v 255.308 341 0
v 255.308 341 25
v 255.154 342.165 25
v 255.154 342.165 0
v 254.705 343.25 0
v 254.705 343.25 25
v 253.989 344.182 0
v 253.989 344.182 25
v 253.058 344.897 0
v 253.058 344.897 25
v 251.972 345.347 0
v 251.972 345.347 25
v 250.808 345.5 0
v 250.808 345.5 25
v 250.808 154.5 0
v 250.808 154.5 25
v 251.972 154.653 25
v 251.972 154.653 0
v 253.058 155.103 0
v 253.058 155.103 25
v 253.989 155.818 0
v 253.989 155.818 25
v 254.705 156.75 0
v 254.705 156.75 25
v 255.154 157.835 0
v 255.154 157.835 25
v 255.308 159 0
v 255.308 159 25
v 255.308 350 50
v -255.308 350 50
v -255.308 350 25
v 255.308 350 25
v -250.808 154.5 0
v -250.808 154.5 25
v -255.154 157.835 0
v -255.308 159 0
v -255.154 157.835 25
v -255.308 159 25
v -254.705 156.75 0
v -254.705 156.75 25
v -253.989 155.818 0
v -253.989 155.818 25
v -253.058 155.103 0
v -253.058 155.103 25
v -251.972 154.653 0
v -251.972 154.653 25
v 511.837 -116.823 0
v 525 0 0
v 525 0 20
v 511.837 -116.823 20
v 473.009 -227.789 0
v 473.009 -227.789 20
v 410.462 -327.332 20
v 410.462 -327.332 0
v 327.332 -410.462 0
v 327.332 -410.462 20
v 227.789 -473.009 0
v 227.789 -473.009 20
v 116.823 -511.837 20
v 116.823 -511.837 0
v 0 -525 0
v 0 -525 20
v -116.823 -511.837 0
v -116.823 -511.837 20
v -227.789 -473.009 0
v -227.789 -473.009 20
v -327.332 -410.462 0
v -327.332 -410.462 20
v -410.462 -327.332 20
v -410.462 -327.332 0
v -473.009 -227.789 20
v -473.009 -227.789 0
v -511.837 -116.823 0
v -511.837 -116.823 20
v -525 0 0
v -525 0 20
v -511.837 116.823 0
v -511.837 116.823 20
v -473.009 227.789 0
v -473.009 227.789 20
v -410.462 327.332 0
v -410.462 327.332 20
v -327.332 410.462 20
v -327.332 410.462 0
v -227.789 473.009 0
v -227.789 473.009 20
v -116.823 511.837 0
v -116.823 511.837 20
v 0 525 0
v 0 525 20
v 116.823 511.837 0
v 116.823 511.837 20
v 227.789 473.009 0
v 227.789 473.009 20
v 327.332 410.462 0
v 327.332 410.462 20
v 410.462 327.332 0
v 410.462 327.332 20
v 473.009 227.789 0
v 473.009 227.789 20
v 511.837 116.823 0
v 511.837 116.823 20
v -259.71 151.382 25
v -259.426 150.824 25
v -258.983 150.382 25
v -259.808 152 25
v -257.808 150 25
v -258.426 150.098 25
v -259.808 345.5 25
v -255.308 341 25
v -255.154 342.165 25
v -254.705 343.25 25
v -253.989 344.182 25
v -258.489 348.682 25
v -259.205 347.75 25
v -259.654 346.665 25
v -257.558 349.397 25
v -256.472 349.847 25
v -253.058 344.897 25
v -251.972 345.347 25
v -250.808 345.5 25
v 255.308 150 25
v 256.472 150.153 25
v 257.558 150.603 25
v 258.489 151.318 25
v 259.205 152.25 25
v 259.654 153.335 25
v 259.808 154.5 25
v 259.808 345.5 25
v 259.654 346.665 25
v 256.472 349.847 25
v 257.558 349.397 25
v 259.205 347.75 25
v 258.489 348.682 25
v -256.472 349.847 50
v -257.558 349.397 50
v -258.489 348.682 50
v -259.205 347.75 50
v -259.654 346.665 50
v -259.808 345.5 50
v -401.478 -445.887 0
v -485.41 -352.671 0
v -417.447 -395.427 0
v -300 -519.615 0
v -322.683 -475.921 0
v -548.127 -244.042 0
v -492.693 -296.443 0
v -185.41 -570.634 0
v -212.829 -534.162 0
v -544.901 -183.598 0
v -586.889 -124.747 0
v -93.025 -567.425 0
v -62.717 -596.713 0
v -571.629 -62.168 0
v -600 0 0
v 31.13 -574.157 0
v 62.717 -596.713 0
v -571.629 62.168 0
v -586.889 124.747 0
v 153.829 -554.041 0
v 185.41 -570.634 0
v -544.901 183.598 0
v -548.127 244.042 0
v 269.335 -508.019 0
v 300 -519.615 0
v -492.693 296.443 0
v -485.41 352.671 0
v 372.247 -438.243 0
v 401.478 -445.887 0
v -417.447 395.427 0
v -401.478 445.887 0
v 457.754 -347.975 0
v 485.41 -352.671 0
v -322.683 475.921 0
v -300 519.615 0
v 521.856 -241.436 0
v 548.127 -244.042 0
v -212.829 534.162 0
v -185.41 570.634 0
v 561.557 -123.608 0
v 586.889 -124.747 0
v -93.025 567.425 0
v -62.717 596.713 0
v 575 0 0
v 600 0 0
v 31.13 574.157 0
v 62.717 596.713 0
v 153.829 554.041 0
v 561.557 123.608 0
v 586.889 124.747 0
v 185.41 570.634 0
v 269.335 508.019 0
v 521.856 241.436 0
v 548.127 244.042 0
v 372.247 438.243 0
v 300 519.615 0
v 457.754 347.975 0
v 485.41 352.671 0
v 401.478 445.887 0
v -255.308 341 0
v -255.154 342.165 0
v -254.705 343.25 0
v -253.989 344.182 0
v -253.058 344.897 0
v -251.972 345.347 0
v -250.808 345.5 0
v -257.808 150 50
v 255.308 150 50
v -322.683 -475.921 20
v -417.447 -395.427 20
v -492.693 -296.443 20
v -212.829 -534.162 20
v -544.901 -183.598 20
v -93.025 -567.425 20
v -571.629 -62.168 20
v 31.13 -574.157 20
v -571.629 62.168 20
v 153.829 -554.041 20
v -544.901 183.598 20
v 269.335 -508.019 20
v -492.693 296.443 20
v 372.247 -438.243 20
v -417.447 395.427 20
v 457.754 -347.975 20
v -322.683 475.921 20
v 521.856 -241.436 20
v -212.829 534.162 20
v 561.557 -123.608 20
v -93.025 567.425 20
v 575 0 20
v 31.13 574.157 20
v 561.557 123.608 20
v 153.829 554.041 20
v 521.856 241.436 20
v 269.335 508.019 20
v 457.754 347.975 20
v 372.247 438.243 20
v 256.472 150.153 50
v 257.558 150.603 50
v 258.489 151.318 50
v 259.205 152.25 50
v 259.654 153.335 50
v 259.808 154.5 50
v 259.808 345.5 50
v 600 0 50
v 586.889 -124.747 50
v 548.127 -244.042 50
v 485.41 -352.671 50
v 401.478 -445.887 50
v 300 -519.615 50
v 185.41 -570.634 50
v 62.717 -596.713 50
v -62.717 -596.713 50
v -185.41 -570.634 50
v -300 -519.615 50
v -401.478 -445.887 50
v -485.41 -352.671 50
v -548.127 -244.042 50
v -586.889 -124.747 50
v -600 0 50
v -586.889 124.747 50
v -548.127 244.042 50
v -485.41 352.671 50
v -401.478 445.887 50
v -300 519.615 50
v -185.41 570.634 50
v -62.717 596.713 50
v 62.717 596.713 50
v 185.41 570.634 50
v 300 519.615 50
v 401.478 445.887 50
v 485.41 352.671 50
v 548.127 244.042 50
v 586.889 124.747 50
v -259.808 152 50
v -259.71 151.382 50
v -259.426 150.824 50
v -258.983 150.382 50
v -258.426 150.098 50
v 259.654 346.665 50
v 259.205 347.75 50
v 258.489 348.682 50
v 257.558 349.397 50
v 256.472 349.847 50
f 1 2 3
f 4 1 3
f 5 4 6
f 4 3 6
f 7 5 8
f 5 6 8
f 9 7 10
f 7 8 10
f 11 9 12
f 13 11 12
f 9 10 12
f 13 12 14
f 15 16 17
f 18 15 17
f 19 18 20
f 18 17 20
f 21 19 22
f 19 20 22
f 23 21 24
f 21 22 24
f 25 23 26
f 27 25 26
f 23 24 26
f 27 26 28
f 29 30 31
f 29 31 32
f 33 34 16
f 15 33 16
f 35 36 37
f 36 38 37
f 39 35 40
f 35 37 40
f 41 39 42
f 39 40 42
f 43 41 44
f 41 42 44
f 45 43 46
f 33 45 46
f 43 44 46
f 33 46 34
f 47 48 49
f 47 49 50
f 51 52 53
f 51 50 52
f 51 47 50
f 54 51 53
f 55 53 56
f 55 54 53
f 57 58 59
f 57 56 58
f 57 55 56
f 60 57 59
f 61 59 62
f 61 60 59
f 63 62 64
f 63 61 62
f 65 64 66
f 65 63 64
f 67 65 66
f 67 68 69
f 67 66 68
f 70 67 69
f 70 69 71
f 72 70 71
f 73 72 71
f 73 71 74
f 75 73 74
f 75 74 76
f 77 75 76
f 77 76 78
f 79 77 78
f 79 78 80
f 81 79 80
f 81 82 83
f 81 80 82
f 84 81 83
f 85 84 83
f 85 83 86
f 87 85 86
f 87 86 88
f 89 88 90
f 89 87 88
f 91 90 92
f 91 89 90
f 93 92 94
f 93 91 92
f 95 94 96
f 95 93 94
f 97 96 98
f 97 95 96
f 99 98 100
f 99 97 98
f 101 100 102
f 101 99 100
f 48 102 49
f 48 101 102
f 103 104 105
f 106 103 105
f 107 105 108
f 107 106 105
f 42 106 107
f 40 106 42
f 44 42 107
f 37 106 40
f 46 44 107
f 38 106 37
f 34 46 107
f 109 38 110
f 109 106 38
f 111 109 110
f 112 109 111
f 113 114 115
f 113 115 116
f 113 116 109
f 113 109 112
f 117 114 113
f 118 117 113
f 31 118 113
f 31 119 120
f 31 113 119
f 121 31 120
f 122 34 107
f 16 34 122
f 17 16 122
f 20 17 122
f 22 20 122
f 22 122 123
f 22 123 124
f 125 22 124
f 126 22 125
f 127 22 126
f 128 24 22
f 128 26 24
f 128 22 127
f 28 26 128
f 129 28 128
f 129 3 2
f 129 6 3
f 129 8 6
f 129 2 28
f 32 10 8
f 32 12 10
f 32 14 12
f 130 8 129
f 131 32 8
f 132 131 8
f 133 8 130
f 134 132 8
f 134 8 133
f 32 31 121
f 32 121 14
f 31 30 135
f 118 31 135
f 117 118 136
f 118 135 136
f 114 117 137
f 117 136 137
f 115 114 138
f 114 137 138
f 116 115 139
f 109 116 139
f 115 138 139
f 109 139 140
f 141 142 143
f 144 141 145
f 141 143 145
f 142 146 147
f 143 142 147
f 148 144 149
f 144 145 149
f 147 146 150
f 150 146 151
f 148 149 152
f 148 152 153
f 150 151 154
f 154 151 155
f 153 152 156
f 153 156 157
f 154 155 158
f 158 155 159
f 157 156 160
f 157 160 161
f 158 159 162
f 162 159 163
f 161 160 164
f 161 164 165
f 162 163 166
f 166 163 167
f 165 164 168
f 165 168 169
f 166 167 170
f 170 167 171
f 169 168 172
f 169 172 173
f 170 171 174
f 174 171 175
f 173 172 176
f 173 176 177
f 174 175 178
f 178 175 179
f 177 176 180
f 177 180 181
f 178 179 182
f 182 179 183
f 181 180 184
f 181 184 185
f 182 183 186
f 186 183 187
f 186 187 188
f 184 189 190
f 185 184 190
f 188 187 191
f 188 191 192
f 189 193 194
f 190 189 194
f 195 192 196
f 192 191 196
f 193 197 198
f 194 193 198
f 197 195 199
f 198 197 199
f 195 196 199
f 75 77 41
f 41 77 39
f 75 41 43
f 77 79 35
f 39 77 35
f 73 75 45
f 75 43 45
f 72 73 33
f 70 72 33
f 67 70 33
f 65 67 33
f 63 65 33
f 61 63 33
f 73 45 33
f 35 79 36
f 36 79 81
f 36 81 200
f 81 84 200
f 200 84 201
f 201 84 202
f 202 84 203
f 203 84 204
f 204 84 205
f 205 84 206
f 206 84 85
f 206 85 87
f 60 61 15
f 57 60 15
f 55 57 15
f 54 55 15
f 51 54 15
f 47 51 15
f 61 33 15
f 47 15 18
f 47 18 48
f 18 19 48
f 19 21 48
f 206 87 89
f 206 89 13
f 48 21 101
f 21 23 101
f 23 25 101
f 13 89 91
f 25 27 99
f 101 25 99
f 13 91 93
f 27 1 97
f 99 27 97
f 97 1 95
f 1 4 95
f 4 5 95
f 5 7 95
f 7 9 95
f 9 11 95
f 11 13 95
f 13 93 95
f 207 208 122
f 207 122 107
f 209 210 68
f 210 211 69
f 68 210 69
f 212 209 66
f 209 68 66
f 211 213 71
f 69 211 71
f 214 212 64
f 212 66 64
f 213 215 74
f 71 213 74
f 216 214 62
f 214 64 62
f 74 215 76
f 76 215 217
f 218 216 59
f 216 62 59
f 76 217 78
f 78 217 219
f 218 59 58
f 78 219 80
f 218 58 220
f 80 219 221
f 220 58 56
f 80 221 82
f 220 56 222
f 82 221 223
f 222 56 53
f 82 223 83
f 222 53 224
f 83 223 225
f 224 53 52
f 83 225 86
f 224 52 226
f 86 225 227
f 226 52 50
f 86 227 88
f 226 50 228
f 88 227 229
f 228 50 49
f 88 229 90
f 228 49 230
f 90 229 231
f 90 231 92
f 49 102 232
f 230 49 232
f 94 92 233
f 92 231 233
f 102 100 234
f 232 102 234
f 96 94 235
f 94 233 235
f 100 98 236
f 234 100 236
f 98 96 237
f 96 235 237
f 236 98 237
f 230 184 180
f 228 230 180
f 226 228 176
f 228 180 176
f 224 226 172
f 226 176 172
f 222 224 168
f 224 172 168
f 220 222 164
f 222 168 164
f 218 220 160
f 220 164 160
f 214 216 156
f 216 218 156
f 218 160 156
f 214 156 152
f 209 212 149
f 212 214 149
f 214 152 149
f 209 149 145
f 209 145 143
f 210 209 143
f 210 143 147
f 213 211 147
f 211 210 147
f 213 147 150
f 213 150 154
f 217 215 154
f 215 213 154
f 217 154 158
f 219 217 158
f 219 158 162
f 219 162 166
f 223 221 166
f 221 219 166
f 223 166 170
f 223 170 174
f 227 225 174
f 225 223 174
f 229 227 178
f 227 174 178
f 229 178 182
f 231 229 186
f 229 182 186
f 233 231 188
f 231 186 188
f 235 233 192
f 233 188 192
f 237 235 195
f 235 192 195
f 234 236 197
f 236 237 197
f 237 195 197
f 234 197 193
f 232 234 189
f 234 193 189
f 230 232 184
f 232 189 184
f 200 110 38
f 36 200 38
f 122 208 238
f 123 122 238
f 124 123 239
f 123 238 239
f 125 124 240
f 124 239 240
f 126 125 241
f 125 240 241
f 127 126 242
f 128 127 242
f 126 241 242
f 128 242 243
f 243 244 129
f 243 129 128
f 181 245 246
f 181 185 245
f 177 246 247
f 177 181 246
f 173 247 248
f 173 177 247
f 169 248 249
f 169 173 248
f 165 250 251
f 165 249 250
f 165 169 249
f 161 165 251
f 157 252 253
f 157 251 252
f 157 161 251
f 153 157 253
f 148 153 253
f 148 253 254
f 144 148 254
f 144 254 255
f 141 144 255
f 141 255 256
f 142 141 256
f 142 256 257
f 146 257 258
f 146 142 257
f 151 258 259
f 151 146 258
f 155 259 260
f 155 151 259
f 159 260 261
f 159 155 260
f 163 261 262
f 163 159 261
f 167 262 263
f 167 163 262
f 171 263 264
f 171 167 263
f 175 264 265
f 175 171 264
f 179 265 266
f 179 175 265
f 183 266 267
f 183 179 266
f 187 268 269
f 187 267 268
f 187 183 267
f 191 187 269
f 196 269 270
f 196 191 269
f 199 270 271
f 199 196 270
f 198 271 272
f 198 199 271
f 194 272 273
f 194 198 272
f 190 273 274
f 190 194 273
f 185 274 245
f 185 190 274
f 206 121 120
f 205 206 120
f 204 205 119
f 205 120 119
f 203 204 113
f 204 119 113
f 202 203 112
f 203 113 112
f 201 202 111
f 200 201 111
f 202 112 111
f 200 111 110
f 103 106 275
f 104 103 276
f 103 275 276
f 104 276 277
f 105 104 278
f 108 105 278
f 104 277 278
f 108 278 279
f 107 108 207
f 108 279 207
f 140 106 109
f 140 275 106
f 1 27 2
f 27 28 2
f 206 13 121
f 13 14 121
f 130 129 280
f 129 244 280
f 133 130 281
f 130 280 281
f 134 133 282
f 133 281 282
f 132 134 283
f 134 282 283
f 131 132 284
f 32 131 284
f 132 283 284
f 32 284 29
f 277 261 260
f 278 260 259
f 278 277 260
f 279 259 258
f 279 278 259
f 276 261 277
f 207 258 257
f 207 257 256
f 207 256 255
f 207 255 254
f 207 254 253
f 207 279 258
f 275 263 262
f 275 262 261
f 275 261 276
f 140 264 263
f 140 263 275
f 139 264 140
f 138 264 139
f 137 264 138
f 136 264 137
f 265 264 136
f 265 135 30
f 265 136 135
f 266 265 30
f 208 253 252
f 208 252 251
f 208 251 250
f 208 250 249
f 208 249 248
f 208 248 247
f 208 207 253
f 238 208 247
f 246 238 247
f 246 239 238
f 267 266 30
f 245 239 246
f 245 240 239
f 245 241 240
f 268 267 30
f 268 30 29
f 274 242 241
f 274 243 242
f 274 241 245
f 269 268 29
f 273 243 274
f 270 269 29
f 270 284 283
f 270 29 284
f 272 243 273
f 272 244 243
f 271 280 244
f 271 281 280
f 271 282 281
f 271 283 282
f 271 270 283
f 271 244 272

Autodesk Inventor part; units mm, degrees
ref_plane "YZ Plane" through (0, 0, 0) normal (1, 0, 0) x (0, 1, 0)
ref_plane "XZ Plane" through (0, 0, 0) normal (0, 1, 0) x (-1, 0, 0)
ref_plane "XY Plane" through (0, 0, 0) normal (0, 0, 1) x (1, 0, 0)
sketch "Sketch1" plane through (0, 0, 0) normal (0, 0, 1) x (1, 0, 0)
  circle A0 centre (0, 0) radius 600
  circle A1 centre (0, 0) radius 575
  circle A2 centre (0, 0) radius 525
  dimension "d0" = 1200
  dimension "d3" = 1150
  dimension "d4" = 1050
extrude "Extrusion1" add sketch "Sketch1" along normal blind 50 contours A0 | A1 | A2
extrude "Extrusion2" cut sketch "Sketch1" along normal blind 20 contours A1
sketch "Sketch2" plane through (0, 0, 50) normal (0, 0, 1) x (1, 0, 0)
  line L0 (0, 0) -> (0, 350) construction
  line L1 (0, 350) -> (-255.3075, 350) construction
  line L2 (-259.8075, 350) -> (255.3075, 350)
  line L3 (259.8075, 345.5) -> (259.8075, 154.5)
  line L4 (255.3075, 150) -> (-257.8075, 150)
  line L5 (-259.8075, 152) -> (-259.8075, 345.5)
  arc A0 (-259.8075, 152) -> (-257.8075, 150) centre (-257.8075, 152) ccw
  arc A1 (-255.3075, 350) -> (-259.8075, 345.5) centre (-255.3075, 345.5) ccw
  arc A2 (259.8075, 345.5) -> (255.3075, 350) centre (255.3075, 345.5) ccw
  arc A3 (255.3075, 150) -> (259.8075, 154.5) centre (255.3075, 154.5) ccw
  line L6 (-259.8075, 150) -> (-259.8075, 154.5) construction
  line L7 (-259.8075, 154.5) -> (-255.3075, 154.5) construction
  line L8 (255.3075, 350) -> (255.3075, 345.5) construction
  line L9 (250.8075, 345.5) -> (-250.8075, 345.5)
  line L10 (-255.3075, 341) -> (-255.3075, 159)
  line L11 (-250.8075, 154.5) -> (250.8075, 154.5)
  line L12 (255.3075, 159) -> (255.3075, 341)
  arc A4 (-255.3075, 159) -> (-250.8075, 154.5) centre (-250.8075, 159) ccw
  arc A5 (-250.8075, 345.5) -> (-255.3075, 341) centre (-250.8075, 341) ccw
  arc A6 (255.3075, 341) -> (250.8075, 345.5) centre (250.8075, 341) ccw
  arc A7 (250.8075, 154.5) -> (255.3075, 159) centre (250.8075, 159) ccw
  point P0 (259.8075, 350)
  dimension "d7" = 350
  dimension "d8" = 259.8075
  dimension "d9" = 519.615
  dimension "d10" = 200
  dimension "d11" = 2
  dimension "d12" = 4.5
  dimension "d13" = 4.5
  dimension "d14" = 4.5
  dimension "d15" = 4.5
extrude "Extrusion3" cut sketch "Sketch2" against normal through all contours A6 L12 A7 L11 A4 L10 A5 L9
extrude "Extrusion4" cut sketch "Sketch2" against normal blind 25
properties part number "Base Plate"
